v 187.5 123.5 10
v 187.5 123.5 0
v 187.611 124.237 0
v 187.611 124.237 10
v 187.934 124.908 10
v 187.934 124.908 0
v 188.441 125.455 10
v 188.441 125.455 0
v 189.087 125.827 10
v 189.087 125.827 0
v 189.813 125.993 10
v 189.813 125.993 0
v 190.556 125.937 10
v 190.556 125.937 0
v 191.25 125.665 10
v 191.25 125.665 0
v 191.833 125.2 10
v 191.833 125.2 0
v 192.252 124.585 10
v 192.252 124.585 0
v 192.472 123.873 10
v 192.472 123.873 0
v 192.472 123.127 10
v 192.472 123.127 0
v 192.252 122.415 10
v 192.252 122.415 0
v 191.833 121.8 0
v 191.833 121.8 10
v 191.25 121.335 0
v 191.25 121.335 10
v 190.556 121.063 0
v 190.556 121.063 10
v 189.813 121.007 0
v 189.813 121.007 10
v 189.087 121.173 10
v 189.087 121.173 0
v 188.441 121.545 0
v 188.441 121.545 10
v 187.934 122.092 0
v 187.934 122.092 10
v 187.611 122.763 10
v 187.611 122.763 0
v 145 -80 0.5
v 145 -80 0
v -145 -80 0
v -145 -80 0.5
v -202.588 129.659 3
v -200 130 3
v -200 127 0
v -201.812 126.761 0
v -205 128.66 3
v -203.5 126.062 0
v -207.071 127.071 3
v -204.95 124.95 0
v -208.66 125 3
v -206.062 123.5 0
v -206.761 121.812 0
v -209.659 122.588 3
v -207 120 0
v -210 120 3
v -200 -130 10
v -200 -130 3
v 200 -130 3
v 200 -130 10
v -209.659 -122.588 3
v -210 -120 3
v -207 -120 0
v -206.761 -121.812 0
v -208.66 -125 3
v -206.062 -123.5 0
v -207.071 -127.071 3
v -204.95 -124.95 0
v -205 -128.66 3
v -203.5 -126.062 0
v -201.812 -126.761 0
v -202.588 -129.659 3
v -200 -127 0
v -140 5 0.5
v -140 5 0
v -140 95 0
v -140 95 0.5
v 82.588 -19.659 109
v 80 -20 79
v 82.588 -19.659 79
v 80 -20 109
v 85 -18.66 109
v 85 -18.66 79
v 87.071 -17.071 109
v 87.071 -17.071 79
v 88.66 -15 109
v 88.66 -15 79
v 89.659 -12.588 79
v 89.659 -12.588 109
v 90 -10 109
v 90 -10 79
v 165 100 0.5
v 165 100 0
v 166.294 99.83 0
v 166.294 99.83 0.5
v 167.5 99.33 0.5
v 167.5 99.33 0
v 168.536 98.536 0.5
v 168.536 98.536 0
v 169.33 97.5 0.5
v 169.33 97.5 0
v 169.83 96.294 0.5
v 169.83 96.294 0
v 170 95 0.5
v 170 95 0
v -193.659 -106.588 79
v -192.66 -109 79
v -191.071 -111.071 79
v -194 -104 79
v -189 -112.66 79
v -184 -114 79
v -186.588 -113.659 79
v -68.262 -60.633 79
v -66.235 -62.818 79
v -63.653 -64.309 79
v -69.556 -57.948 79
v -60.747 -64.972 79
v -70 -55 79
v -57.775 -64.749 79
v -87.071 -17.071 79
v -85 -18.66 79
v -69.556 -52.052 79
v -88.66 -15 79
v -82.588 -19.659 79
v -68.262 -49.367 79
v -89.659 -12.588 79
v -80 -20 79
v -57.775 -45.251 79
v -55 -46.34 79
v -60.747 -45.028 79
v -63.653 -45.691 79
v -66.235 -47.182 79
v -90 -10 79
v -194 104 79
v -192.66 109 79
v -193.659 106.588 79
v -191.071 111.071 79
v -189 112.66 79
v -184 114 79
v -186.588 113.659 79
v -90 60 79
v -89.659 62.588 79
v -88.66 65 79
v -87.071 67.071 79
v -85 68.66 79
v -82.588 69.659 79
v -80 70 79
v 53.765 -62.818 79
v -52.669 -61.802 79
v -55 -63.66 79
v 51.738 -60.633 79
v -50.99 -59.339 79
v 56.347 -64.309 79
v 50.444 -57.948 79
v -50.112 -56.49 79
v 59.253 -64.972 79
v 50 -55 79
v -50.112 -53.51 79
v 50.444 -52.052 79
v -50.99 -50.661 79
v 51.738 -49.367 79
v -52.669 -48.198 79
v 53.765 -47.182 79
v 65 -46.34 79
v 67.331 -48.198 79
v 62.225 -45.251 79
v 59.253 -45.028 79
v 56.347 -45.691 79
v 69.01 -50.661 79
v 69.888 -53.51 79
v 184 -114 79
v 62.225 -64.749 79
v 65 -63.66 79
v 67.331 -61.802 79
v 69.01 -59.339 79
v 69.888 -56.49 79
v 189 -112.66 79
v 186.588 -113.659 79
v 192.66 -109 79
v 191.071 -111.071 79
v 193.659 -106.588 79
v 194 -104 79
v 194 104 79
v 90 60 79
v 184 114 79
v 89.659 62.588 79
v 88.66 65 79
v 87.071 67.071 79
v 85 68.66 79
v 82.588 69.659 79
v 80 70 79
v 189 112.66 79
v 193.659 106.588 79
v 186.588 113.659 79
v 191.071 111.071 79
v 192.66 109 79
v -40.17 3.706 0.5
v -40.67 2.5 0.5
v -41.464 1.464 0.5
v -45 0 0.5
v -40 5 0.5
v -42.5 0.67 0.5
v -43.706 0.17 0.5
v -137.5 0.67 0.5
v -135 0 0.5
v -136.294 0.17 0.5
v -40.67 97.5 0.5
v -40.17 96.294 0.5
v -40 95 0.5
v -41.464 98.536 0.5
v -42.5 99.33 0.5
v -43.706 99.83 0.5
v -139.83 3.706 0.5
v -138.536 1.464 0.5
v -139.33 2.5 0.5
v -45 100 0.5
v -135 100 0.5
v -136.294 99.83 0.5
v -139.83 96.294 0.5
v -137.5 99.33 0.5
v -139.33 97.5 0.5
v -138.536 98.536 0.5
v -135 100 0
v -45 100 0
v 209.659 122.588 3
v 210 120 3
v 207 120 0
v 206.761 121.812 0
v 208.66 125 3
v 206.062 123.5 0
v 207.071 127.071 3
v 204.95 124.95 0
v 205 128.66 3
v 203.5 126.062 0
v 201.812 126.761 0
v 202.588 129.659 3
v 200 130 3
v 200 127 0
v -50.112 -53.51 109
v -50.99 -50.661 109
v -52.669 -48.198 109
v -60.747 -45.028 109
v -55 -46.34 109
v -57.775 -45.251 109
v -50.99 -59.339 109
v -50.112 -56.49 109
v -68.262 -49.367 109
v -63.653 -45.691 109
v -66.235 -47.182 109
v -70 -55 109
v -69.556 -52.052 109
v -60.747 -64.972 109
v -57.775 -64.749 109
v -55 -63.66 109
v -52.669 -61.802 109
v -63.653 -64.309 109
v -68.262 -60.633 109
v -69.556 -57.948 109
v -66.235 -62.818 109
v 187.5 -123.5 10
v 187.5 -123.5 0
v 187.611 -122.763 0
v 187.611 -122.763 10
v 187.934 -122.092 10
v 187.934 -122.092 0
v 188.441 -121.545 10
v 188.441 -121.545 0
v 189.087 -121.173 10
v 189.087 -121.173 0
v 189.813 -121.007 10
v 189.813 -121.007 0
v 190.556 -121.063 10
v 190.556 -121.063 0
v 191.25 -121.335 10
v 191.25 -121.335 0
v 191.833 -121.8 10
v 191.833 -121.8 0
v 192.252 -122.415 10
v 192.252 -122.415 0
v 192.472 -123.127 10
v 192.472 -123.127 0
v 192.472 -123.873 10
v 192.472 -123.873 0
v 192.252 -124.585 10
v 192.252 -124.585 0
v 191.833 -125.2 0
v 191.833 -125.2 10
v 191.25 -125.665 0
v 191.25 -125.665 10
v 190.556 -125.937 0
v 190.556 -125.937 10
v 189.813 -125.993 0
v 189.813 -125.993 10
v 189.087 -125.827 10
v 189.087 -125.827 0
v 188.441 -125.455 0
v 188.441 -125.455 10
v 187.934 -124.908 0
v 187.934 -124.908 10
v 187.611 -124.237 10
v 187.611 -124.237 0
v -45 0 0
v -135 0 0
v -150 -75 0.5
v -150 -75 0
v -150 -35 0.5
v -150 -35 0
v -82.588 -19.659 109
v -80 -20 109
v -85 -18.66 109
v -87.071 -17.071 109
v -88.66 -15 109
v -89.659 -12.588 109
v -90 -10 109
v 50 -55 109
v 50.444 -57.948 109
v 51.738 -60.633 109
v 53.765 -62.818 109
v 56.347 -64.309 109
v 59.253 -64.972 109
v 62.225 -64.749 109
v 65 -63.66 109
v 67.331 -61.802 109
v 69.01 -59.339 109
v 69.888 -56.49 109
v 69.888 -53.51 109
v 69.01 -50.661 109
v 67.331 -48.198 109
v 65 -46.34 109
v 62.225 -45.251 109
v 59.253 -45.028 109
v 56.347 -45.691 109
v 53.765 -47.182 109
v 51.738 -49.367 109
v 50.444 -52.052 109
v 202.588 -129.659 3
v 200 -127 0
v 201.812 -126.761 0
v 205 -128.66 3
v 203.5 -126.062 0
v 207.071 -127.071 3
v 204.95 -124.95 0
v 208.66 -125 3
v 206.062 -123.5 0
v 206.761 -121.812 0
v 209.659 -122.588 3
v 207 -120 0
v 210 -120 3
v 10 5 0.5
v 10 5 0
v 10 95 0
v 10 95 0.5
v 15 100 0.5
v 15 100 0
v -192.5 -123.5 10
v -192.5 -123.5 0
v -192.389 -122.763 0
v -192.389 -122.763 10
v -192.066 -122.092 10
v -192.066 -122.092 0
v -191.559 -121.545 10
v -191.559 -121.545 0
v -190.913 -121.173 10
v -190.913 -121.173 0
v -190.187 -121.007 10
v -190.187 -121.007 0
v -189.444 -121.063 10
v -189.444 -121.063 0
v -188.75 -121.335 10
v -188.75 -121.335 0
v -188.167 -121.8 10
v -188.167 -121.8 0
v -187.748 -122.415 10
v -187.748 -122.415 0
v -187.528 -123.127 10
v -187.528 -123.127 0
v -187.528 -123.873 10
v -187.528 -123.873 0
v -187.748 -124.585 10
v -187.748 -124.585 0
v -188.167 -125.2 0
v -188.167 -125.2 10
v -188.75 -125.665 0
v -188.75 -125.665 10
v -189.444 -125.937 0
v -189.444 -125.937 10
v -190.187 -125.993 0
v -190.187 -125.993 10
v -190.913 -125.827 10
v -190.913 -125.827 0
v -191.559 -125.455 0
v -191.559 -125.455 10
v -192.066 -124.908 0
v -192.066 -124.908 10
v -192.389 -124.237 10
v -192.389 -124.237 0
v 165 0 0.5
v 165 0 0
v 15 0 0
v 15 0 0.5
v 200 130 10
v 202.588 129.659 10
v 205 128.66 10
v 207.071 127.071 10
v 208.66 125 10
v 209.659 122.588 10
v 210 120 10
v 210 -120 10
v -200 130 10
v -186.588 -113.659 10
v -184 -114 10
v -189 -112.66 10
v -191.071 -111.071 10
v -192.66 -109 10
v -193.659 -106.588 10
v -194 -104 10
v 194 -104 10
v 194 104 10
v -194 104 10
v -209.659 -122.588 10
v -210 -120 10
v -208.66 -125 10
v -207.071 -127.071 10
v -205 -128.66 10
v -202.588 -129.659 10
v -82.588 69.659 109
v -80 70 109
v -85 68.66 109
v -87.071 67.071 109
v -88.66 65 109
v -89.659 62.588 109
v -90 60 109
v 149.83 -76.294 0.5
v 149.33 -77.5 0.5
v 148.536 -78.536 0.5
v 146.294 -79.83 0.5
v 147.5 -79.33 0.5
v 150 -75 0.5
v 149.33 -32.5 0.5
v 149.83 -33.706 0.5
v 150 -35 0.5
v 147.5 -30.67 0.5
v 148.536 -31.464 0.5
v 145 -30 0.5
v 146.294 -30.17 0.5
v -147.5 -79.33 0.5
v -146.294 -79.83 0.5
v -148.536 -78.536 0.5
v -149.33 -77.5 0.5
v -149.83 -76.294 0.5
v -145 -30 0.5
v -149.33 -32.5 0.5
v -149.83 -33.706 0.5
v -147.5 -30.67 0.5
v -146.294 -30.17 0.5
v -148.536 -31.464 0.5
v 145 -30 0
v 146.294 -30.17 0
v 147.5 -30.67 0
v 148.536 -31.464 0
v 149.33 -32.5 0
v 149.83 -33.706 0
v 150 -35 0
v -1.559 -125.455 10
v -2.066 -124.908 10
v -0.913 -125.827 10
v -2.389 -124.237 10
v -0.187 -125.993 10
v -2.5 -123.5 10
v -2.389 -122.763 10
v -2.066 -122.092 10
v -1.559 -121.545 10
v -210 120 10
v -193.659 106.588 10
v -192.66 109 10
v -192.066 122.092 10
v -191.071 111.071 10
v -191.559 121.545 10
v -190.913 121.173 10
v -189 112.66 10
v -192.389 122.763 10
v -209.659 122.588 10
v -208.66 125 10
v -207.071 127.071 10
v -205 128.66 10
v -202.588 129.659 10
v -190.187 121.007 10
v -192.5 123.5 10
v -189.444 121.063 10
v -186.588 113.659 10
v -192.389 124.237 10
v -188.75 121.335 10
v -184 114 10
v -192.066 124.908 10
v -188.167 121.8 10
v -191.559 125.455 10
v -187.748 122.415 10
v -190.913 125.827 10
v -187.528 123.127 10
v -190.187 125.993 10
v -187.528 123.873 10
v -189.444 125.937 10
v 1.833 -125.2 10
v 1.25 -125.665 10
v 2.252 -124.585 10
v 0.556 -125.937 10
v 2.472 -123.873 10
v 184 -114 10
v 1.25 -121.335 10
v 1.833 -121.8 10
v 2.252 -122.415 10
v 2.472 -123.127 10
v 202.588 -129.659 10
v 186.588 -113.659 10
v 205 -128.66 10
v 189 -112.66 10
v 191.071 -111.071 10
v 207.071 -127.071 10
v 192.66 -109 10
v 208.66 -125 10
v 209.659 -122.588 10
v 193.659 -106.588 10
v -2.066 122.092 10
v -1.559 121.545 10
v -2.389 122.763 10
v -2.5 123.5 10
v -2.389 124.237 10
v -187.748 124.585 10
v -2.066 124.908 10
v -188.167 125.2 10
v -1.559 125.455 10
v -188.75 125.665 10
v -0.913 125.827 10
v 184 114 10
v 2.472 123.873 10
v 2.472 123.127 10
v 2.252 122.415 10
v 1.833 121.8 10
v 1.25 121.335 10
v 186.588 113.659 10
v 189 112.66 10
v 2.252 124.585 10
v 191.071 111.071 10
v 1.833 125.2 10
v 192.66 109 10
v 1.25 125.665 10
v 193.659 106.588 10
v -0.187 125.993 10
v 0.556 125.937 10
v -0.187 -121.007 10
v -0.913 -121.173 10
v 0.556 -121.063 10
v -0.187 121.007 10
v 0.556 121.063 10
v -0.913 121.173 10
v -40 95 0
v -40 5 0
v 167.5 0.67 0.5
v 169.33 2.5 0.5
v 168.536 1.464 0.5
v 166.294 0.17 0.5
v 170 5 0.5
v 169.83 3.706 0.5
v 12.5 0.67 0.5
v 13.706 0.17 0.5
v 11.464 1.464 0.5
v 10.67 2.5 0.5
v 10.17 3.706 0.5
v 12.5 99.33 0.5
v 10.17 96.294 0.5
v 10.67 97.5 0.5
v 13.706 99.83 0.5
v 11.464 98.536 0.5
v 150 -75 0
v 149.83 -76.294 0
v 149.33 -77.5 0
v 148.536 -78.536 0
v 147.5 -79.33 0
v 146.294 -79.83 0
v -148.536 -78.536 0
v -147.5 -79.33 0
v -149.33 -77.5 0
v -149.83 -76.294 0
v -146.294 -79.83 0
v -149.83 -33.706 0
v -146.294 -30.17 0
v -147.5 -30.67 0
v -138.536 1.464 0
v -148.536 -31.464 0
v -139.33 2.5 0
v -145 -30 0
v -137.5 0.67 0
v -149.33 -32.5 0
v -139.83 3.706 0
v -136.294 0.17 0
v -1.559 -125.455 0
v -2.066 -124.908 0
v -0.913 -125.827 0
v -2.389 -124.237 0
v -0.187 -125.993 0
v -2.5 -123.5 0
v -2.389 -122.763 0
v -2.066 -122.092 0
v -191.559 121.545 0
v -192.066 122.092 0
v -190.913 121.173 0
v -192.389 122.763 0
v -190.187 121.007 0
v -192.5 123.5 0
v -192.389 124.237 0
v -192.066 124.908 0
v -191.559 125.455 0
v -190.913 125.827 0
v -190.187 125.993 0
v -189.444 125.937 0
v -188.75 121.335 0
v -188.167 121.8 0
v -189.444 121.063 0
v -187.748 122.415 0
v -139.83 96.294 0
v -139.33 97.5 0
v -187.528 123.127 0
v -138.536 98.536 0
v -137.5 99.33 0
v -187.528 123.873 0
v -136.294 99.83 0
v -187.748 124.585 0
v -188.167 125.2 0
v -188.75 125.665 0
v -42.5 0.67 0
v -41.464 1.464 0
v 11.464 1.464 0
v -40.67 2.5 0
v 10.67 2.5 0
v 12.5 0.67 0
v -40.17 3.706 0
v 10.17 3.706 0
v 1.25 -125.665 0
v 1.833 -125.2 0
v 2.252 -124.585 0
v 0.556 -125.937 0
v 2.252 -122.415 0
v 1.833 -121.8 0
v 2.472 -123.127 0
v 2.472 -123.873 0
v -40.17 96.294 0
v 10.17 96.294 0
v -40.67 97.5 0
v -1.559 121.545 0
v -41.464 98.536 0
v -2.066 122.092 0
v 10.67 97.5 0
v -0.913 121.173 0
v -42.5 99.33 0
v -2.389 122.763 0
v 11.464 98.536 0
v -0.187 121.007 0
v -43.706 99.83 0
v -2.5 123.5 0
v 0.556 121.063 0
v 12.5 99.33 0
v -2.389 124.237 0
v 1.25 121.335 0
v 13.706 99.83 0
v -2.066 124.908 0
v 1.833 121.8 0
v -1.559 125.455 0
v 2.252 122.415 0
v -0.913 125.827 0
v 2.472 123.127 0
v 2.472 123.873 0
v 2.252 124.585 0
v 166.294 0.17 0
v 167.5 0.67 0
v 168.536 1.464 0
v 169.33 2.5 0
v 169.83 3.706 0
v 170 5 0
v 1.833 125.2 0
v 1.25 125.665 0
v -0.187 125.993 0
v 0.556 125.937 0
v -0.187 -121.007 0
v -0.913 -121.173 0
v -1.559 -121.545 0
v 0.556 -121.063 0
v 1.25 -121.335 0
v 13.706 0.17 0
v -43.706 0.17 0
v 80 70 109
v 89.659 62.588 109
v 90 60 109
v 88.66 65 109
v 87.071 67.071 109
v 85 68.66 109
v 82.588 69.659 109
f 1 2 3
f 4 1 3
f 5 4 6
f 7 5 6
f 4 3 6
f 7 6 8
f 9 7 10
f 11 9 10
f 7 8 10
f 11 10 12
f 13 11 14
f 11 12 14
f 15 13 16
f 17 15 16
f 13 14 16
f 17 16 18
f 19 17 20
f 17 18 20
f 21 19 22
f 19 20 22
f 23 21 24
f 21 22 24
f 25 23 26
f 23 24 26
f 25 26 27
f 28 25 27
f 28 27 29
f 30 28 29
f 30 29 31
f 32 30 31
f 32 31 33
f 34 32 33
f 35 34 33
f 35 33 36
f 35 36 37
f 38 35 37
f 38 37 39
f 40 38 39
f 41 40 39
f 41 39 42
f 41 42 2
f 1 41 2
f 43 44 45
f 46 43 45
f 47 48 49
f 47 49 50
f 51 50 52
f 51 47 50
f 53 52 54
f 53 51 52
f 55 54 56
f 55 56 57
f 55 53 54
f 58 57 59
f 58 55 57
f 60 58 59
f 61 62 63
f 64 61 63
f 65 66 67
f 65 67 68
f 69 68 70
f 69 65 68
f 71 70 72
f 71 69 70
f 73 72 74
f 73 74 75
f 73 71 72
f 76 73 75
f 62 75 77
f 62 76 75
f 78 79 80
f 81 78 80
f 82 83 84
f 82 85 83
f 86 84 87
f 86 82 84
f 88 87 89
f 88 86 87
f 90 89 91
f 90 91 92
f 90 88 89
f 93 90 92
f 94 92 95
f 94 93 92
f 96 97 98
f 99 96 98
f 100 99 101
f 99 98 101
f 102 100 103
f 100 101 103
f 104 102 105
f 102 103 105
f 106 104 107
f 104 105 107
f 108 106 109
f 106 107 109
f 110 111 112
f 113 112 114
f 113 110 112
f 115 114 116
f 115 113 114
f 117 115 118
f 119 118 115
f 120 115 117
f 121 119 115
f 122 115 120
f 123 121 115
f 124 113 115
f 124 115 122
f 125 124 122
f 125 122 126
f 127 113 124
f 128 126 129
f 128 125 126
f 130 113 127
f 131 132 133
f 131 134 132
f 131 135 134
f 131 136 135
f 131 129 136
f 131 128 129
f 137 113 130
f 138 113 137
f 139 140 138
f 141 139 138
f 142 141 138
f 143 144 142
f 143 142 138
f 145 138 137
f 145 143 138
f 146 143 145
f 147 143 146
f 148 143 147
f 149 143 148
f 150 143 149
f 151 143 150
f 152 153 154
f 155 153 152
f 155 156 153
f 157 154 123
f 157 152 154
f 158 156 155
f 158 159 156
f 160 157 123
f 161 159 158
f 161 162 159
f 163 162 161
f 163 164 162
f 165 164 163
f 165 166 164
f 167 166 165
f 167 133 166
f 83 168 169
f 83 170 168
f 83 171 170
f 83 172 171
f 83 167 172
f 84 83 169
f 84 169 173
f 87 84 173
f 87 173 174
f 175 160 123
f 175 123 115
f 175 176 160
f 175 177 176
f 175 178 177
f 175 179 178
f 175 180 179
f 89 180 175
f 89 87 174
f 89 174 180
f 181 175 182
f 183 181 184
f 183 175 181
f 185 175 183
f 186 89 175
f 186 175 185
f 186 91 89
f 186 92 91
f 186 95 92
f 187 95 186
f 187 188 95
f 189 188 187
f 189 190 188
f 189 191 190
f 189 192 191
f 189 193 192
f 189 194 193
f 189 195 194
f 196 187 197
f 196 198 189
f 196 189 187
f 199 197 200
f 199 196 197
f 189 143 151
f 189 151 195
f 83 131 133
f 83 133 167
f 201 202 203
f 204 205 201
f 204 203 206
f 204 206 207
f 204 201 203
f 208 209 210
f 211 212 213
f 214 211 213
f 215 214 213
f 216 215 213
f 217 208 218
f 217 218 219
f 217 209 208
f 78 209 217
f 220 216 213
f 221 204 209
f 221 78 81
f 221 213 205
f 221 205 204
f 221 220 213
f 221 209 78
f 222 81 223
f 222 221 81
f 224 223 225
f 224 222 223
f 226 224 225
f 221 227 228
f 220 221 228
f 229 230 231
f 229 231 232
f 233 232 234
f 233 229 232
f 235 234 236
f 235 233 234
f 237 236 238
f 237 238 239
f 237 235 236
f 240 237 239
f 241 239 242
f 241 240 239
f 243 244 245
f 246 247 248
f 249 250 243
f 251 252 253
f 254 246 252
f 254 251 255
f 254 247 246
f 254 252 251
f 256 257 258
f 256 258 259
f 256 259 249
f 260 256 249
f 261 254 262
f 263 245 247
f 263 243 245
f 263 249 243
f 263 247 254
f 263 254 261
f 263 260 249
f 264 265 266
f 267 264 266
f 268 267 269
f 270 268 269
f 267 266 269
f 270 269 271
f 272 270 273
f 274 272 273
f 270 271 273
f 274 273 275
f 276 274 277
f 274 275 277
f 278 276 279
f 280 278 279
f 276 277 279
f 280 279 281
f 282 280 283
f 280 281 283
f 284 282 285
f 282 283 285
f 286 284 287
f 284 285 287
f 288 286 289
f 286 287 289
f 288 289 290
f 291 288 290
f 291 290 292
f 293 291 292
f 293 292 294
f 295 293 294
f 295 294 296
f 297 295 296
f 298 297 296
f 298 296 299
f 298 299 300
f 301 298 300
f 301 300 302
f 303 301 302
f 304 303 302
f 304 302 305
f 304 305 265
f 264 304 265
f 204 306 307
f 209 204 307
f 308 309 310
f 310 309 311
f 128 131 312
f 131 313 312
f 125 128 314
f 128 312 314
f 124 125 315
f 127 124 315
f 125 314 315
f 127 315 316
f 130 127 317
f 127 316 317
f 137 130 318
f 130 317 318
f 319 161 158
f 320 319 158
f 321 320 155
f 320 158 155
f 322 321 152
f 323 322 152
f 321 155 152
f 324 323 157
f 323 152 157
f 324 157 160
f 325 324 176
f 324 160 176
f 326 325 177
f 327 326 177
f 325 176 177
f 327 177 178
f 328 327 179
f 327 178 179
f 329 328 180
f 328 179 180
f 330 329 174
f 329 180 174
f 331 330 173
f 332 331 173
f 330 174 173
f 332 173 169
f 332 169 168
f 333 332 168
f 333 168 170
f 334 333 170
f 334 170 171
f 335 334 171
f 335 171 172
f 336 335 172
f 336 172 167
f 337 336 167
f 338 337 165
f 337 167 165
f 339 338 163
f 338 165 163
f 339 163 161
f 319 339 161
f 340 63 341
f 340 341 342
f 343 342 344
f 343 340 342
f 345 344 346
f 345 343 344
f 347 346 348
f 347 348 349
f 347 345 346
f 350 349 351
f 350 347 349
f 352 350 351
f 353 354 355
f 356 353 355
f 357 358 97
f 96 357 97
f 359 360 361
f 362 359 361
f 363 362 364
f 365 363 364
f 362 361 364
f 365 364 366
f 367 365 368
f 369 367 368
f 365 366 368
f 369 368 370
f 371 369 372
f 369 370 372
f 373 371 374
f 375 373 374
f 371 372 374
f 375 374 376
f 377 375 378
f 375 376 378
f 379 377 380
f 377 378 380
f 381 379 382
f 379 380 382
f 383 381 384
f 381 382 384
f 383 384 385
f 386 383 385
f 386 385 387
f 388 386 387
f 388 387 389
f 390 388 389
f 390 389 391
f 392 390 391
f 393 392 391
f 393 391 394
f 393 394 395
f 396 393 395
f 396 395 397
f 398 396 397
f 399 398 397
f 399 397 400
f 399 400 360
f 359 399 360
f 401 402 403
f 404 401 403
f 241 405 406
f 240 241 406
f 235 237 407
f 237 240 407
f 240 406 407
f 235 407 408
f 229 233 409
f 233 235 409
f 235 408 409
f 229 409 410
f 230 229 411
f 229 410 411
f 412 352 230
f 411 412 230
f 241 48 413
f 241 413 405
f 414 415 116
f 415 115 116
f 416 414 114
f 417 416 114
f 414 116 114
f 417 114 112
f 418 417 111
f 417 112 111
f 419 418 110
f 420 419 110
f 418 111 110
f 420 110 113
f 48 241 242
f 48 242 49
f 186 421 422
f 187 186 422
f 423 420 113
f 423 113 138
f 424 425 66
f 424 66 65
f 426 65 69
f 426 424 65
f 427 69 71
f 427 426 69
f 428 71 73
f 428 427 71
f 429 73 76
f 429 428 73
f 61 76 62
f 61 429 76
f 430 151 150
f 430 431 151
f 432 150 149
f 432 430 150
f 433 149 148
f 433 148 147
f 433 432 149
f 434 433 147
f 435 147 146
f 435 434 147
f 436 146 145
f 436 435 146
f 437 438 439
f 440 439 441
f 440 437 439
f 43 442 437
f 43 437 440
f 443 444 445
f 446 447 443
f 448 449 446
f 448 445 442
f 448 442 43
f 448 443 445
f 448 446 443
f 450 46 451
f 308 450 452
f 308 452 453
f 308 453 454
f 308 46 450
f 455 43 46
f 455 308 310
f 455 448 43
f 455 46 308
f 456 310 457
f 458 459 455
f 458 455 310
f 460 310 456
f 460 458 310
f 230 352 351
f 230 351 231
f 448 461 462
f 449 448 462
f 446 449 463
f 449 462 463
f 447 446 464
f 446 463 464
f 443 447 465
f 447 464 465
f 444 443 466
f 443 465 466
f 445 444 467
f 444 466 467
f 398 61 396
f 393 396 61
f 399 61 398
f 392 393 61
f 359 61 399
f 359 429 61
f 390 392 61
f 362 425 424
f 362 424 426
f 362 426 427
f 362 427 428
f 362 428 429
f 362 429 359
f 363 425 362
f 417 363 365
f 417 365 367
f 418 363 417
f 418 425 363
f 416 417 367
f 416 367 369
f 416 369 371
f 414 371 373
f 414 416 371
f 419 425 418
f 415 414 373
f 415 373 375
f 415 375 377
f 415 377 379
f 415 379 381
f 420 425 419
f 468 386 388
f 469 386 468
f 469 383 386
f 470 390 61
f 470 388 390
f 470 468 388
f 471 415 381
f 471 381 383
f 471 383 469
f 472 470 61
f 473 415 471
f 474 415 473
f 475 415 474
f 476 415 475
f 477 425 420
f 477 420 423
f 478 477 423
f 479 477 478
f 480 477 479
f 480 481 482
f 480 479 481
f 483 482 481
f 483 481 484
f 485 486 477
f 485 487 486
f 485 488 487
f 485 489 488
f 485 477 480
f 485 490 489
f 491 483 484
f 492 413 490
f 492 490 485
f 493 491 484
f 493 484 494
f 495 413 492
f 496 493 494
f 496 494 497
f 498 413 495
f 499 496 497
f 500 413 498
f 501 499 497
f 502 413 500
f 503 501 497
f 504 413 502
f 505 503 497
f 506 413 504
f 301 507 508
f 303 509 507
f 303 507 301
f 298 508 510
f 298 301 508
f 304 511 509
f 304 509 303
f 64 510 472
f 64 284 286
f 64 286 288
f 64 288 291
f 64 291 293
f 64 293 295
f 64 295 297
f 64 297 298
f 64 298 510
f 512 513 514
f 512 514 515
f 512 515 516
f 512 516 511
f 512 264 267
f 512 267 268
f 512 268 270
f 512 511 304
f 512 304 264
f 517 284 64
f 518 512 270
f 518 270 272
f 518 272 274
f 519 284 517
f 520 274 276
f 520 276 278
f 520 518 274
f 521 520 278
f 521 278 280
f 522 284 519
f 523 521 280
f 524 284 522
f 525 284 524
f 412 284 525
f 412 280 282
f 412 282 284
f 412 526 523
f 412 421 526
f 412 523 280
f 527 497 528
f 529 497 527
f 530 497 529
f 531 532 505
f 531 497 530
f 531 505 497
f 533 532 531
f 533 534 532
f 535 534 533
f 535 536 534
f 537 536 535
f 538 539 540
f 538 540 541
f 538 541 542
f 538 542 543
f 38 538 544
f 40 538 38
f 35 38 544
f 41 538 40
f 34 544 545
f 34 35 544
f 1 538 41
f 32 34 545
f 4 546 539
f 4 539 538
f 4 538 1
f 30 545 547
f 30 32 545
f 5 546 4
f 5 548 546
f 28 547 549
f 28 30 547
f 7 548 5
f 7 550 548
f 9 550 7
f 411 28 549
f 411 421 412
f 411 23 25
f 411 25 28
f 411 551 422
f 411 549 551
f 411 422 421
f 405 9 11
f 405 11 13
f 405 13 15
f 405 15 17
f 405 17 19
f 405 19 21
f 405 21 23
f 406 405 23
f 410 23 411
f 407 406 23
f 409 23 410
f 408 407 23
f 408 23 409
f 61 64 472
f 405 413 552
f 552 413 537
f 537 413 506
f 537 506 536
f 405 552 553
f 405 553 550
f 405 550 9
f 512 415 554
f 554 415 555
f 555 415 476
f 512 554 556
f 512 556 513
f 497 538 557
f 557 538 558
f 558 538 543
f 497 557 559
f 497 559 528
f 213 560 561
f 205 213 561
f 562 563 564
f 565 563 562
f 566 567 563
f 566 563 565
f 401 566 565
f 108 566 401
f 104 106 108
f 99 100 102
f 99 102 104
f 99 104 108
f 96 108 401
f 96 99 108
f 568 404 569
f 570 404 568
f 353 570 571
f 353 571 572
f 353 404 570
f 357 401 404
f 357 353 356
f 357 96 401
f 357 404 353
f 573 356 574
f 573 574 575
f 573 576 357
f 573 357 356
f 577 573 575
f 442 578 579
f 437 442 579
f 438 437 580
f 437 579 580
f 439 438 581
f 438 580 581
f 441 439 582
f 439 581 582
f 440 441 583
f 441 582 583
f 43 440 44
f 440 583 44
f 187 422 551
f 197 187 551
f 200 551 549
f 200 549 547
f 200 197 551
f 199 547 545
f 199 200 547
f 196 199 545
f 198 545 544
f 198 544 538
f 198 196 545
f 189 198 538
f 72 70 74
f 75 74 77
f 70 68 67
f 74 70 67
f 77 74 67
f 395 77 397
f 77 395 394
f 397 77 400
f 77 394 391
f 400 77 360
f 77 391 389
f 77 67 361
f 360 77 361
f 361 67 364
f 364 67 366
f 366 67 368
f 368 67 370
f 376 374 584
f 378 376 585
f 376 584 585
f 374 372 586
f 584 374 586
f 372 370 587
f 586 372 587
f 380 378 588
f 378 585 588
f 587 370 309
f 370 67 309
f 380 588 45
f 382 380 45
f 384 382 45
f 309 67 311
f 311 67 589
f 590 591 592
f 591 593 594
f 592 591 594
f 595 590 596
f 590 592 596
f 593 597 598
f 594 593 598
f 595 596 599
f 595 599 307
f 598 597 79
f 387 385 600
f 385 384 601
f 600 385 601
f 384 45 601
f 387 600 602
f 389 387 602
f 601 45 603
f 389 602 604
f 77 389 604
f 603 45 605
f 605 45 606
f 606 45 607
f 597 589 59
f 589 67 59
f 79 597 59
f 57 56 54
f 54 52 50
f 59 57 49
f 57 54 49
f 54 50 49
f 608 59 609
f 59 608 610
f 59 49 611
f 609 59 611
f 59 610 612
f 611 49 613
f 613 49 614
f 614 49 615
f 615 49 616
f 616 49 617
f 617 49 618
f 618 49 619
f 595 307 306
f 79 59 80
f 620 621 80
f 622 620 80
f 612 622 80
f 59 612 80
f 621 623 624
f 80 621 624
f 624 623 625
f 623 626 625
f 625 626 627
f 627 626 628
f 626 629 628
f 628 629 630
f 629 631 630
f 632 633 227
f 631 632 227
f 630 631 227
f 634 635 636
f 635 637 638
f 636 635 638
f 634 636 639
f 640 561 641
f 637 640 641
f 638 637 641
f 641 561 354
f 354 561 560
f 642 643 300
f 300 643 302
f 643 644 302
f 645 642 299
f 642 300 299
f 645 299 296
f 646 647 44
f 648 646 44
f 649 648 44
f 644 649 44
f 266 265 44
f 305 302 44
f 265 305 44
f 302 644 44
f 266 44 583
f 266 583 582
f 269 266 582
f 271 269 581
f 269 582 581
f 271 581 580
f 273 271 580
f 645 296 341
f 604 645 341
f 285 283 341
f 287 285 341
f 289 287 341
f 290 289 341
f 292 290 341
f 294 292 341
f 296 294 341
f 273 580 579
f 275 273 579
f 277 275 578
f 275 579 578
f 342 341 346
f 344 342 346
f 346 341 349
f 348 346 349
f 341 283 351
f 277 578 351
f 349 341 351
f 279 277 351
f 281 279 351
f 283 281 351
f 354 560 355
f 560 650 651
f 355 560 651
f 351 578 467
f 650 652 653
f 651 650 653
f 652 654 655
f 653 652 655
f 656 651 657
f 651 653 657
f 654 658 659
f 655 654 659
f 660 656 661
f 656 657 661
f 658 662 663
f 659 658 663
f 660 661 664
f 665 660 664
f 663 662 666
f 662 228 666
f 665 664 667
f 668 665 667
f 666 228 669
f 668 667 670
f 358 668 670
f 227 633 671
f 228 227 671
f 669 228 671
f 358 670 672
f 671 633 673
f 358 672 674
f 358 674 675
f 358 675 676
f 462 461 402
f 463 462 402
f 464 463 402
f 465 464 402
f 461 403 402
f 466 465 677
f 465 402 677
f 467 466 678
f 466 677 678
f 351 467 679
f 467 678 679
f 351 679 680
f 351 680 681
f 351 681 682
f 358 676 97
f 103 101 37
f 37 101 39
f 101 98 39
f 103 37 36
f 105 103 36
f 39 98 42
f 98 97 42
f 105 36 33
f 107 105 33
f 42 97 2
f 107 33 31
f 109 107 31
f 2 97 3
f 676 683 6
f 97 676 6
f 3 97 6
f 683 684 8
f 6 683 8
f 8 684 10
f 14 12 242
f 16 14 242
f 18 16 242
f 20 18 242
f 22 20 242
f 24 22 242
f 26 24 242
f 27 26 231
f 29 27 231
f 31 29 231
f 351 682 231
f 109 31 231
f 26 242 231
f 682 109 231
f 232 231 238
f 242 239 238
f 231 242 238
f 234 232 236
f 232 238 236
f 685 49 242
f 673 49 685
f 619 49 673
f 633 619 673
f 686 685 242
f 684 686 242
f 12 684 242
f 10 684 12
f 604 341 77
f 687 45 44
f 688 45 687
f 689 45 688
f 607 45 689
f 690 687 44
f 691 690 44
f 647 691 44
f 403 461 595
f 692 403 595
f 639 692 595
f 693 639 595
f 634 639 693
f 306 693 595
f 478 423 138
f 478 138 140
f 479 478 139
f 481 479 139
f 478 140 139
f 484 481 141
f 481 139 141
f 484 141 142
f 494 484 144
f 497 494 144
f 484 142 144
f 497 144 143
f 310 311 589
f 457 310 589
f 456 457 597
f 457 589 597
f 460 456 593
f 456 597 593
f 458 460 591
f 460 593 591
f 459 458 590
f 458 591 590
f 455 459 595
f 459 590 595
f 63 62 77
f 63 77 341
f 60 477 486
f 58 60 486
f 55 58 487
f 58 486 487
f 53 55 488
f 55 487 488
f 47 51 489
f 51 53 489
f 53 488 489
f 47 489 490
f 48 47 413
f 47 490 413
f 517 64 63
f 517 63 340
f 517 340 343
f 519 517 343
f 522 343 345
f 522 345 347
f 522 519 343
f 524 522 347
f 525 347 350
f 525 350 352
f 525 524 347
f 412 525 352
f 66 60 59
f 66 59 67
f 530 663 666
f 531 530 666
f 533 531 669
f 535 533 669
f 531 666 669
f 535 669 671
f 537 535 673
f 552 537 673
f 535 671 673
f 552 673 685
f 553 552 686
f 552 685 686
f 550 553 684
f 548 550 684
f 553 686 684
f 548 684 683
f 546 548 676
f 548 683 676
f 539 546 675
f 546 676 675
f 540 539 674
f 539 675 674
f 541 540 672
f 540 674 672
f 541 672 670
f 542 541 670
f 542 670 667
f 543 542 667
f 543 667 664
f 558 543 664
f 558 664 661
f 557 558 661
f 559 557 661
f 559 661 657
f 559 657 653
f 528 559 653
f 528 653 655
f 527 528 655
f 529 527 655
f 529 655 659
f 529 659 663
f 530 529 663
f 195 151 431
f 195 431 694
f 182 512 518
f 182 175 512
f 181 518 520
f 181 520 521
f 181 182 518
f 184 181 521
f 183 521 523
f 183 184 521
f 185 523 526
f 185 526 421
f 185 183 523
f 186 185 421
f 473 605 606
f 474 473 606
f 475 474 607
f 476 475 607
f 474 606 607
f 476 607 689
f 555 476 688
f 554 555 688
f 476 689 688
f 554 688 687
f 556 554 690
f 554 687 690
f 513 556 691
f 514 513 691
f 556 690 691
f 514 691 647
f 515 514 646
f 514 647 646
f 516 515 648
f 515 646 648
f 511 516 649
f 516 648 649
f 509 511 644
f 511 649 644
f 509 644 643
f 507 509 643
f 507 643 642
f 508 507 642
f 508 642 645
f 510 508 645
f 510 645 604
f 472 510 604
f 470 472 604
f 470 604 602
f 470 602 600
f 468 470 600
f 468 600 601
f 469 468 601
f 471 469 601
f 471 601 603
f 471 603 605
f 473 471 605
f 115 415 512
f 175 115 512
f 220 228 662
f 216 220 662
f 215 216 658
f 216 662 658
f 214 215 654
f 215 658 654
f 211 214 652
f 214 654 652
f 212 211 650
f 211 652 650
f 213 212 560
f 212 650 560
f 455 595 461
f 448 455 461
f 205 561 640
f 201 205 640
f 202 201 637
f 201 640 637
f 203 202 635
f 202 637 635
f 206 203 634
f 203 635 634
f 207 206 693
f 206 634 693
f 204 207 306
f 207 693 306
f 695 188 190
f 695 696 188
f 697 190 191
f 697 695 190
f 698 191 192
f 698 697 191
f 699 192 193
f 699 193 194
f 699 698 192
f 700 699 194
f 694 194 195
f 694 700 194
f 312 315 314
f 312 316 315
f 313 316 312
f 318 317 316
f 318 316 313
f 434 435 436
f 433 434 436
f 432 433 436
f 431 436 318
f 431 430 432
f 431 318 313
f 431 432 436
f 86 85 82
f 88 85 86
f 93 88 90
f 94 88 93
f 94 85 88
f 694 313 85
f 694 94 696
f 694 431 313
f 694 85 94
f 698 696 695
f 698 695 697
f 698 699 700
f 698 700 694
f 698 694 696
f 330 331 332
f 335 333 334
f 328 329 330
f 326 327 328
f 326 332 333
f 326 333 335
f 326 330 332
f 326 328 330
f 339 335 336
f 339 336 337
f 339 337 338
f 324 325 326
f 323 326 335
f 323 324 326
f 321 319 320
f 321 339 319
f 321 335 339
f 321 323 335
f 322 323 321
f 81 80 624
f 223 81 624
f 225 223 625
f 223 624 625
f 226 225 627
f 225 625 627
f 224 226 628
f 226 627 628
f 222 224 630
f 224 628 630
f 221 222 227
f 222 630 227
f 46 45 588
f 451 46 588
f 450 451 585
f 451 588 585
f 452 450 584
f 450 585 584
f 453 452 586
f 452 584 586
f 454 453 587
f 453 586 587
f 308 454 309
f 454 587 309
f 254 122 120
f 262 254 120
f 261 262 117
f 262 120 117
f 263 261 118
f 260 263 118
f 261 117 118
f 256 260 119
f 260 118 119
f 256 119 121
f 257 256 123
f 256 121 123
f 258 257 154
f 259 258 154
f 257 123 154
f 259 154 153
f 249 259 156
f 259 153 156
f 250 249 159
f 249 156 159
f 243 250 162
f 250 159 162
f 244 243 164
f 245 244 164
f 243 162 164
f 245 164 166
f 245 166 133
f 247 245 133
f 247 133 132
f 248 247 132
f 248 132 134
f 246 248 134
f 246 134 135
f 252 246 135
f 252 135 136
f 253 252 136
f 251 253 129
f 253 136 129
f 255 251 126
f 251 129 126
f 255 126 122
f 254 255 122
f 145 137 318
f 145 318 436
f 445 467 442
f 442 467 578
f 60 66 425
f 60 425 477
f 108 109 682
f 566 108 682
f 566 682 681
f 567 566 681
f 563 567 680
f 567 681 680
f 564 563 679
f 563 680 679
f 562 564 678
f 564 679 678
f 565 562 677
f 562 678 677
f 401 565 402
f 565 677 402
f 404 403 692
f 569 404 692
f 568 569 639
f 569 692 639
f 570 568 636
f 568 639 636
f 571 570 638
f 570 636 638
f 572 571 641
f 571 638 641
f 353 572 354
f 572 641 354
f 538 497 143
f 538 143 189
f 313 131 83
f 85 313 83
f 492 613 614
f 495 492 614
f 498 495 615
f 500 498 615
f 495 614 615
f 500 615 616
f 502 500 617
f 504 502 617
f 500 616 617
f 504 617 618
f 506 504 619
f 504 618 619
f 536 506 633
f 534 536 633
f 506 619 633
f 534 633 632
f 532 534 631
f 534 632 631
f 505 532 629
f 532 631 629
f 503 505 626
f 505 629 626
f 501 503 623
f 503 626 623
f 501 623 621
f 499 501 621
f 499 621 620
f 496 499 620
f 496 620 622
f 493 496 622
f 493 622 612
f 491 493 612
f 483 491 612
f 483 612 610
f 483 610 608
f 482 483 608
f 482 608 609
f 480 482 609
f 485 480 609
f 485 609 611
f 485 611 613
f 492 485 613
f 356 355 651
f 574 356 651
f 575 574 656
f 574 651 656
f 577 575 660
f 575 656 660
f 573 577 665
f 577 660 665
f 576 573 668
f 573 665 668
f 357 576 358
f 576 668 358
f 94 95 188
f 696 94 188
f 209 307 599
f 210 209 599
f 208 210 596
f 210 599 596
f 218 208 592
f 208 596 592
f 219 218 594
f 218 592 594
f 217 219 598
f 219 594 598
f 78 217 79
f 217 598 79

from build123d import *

# Parameters (mm, degrees)
SKETCH_1_W          = 420
SKETCH_1_H          = 260
EXTRUDE_1_DEPTH     = 10
SKETCH_2_W          = 388
SKETCH_2_H          = 228
EXTRUDE_2_DEPTH     = 69
SKETCH_3_R          = 10
SKETCH_3_W          = 180
SKETCH_3_H          = 90
EXTRUDE_3_DEPTH     = 30
SKETCH_4_R          = 2.5
CUT_EXTRUDE_1_DEPTH = 270.964812522
FILLET_1_R          = 10
CUT_EXTRUDE_2_DEPTH = 0.5
CHAMFER_1_SIZE      = 3


with BuildPart() as part:
    # 草图1 → 凸台-拉伸1 (new body)
    with BuildSketch(Plane.XY):
        Rectangle(SKETCH_1_W, SKETCH_1_H)
    extrude(amount=EXTRUDE_1_DEPTH)

    # 草图2 → 凸台-拉伸2 (add)
    with BuildSketch(Plane.XY.offset(10)):
        Rectangle(SKETCH_2_W, SKETCH_2_H)
    extrude(amount=EXTRUDE_2_DEPTH)

    # 草图3 → 凸台-拉伸3 (add)
    with BuildSketch(Plane.XY.offset(79)):
        with Locations(Location((-60, -55, 0), (0, 0, 180))):
            Circle(SKETCH_3_R)
        with Locations(Location((60, -55, 0), (0, 0, 180))):
            Circle(SKETCH_3_R)
        with Locations((0, 25)):
            Rectangle(SKETCH_3_W, SKETCH_3_H)
    extrude(amount=EXTRUDE_3_DEPTH)

    # 草图4 → 切除-拉伸1 (cut, through all)
    with BuildSketch(Plane(origin=(0, 0, 0), x_dir=(-1, 0, 0), z_dir=(0, 0, -1))):
        with Locations((-190, 123.5)):
            Circle(SKETCH_4_R)
        with Locations((0, 123.5)):
            Circle(SKETCH_4_R)
        with Locations((190, 123.5)):
            Circle(SKETCH_4_R)
        with Locations((190, -123.5)):
            Circle(SKETCH_4_R)
        with Locations((0, -123.5)):
            Circle(SKETCH_4_R)
        with Locations((-190, -123.5)):
            Circle(SKETCH_4_R)
    extrude(amount=-CUT_EXTRUDE_1_DEPTH, mode=Mode.SUBTRACT)

    # 圆角1
    fillet_1_edges = [part.edges().sort_by_distance(p)[0] for p in [
        (194, -114, 44.5),
        (194, 114, 44.5),
        (-194, 114, 44.5),
        (-194, -114, 44.5),
        (90, -20, 94),
        (90, 70, 94),
        (-90, 70, 94),
        (-90, -20, 94),
        (210, -130, 5),
        (-210, -130, 5),
        (-210, 130, 5),
        (210, 130, 5),
    ]]
    fillet(fillet_1_edges, radius=FILLET_1_R)

    # 草图5 → 切除-拉伸2 (cut)
    with BuildSketch(Plane(origin=(0, 0, 0), x_dir=(-1, 0, 0), z_dir=(0, 0, -1))):
        with BuildLine():
            Line((-165, 0), (-15, 0))
            ThreePointArc((-15, 0), (-11.464466094, 1.464466094), (-10, 5))
            Line((-10, 5), (-10, 95))
            ThreePointArc((-10, 95), (-11.464466094, 98.535533906), (-15, 100))
            Line((-15, 100), (-165, 100))
            ThreePointArc((-165, 100), (-168.535533906, 98.535533906), (-170, 95))
            Line((-170, 95), (-170, 5))
            ThreePointArc((-170, 5), (-168.535533906, 1.464466094), (-165, 0))
        make_face()
        with BuildLine():
            Line((45, 0), (135, 0))
            ThreePointArc((135, 0), (138.535533906, 1.464466094), (140, 5))
            Line((140, 5), (140, 95))
            ThreePointArc((140, 95), (138.535533906, 98.535533906), (135, 100))
            Line((135, 100), (45, 100))
            ThreePointArc((45, 100), (41.464466094, 98.535533906), (40, 95))
            Line((40, 95), (40, 5))
            ThreePointArc((40, 5), (41.464466094, 1.464466094), (45, 0))
        make_face()
        with BuildLine():
            Line((-145, -80), (145, -80))
            ThreePointArc((145, -80), (148.535533906, -78.535533906), (150, -75))
            Line((150, -75), (150, -35))
            ThreePointArc((150, -35), (148.535533906, -31.464466094), (145, -30))
            Line((145, -30), (-145, -30))
            ThreePointArc((-145, -30), (-148.535533906, -31.464466094), (-150, -35))
            Line((-150, -35), (-150, -75))
            ThreePointArc((-150, -75), (-148.535533906, -78.535533906), (-145, -80))
        make_face()
    extrude(amount=-CUT_EXTRUDE_2_DEPTH, mode=Mode.SUBTRACT)

    # 倒角1
    chamfer_1_edges = [part.edges().sort_by_distance(p)[0] for p in [
        (210, 0, 0),
        (0, -130, 0),
        (-210, 0, 0),
        (0, 130, 0),
        (207.071067812, 127.071067812, 0),
        (-207.071067812, 127.071067812, 0),
        (-207.071067812, -127.071067812, 0),
        (207.071067812, -127.071067812, 0),
    ]]
    chamfer(chamfer_1_edges, length=CHAMFER_1_SIZE)


solid = part.part
